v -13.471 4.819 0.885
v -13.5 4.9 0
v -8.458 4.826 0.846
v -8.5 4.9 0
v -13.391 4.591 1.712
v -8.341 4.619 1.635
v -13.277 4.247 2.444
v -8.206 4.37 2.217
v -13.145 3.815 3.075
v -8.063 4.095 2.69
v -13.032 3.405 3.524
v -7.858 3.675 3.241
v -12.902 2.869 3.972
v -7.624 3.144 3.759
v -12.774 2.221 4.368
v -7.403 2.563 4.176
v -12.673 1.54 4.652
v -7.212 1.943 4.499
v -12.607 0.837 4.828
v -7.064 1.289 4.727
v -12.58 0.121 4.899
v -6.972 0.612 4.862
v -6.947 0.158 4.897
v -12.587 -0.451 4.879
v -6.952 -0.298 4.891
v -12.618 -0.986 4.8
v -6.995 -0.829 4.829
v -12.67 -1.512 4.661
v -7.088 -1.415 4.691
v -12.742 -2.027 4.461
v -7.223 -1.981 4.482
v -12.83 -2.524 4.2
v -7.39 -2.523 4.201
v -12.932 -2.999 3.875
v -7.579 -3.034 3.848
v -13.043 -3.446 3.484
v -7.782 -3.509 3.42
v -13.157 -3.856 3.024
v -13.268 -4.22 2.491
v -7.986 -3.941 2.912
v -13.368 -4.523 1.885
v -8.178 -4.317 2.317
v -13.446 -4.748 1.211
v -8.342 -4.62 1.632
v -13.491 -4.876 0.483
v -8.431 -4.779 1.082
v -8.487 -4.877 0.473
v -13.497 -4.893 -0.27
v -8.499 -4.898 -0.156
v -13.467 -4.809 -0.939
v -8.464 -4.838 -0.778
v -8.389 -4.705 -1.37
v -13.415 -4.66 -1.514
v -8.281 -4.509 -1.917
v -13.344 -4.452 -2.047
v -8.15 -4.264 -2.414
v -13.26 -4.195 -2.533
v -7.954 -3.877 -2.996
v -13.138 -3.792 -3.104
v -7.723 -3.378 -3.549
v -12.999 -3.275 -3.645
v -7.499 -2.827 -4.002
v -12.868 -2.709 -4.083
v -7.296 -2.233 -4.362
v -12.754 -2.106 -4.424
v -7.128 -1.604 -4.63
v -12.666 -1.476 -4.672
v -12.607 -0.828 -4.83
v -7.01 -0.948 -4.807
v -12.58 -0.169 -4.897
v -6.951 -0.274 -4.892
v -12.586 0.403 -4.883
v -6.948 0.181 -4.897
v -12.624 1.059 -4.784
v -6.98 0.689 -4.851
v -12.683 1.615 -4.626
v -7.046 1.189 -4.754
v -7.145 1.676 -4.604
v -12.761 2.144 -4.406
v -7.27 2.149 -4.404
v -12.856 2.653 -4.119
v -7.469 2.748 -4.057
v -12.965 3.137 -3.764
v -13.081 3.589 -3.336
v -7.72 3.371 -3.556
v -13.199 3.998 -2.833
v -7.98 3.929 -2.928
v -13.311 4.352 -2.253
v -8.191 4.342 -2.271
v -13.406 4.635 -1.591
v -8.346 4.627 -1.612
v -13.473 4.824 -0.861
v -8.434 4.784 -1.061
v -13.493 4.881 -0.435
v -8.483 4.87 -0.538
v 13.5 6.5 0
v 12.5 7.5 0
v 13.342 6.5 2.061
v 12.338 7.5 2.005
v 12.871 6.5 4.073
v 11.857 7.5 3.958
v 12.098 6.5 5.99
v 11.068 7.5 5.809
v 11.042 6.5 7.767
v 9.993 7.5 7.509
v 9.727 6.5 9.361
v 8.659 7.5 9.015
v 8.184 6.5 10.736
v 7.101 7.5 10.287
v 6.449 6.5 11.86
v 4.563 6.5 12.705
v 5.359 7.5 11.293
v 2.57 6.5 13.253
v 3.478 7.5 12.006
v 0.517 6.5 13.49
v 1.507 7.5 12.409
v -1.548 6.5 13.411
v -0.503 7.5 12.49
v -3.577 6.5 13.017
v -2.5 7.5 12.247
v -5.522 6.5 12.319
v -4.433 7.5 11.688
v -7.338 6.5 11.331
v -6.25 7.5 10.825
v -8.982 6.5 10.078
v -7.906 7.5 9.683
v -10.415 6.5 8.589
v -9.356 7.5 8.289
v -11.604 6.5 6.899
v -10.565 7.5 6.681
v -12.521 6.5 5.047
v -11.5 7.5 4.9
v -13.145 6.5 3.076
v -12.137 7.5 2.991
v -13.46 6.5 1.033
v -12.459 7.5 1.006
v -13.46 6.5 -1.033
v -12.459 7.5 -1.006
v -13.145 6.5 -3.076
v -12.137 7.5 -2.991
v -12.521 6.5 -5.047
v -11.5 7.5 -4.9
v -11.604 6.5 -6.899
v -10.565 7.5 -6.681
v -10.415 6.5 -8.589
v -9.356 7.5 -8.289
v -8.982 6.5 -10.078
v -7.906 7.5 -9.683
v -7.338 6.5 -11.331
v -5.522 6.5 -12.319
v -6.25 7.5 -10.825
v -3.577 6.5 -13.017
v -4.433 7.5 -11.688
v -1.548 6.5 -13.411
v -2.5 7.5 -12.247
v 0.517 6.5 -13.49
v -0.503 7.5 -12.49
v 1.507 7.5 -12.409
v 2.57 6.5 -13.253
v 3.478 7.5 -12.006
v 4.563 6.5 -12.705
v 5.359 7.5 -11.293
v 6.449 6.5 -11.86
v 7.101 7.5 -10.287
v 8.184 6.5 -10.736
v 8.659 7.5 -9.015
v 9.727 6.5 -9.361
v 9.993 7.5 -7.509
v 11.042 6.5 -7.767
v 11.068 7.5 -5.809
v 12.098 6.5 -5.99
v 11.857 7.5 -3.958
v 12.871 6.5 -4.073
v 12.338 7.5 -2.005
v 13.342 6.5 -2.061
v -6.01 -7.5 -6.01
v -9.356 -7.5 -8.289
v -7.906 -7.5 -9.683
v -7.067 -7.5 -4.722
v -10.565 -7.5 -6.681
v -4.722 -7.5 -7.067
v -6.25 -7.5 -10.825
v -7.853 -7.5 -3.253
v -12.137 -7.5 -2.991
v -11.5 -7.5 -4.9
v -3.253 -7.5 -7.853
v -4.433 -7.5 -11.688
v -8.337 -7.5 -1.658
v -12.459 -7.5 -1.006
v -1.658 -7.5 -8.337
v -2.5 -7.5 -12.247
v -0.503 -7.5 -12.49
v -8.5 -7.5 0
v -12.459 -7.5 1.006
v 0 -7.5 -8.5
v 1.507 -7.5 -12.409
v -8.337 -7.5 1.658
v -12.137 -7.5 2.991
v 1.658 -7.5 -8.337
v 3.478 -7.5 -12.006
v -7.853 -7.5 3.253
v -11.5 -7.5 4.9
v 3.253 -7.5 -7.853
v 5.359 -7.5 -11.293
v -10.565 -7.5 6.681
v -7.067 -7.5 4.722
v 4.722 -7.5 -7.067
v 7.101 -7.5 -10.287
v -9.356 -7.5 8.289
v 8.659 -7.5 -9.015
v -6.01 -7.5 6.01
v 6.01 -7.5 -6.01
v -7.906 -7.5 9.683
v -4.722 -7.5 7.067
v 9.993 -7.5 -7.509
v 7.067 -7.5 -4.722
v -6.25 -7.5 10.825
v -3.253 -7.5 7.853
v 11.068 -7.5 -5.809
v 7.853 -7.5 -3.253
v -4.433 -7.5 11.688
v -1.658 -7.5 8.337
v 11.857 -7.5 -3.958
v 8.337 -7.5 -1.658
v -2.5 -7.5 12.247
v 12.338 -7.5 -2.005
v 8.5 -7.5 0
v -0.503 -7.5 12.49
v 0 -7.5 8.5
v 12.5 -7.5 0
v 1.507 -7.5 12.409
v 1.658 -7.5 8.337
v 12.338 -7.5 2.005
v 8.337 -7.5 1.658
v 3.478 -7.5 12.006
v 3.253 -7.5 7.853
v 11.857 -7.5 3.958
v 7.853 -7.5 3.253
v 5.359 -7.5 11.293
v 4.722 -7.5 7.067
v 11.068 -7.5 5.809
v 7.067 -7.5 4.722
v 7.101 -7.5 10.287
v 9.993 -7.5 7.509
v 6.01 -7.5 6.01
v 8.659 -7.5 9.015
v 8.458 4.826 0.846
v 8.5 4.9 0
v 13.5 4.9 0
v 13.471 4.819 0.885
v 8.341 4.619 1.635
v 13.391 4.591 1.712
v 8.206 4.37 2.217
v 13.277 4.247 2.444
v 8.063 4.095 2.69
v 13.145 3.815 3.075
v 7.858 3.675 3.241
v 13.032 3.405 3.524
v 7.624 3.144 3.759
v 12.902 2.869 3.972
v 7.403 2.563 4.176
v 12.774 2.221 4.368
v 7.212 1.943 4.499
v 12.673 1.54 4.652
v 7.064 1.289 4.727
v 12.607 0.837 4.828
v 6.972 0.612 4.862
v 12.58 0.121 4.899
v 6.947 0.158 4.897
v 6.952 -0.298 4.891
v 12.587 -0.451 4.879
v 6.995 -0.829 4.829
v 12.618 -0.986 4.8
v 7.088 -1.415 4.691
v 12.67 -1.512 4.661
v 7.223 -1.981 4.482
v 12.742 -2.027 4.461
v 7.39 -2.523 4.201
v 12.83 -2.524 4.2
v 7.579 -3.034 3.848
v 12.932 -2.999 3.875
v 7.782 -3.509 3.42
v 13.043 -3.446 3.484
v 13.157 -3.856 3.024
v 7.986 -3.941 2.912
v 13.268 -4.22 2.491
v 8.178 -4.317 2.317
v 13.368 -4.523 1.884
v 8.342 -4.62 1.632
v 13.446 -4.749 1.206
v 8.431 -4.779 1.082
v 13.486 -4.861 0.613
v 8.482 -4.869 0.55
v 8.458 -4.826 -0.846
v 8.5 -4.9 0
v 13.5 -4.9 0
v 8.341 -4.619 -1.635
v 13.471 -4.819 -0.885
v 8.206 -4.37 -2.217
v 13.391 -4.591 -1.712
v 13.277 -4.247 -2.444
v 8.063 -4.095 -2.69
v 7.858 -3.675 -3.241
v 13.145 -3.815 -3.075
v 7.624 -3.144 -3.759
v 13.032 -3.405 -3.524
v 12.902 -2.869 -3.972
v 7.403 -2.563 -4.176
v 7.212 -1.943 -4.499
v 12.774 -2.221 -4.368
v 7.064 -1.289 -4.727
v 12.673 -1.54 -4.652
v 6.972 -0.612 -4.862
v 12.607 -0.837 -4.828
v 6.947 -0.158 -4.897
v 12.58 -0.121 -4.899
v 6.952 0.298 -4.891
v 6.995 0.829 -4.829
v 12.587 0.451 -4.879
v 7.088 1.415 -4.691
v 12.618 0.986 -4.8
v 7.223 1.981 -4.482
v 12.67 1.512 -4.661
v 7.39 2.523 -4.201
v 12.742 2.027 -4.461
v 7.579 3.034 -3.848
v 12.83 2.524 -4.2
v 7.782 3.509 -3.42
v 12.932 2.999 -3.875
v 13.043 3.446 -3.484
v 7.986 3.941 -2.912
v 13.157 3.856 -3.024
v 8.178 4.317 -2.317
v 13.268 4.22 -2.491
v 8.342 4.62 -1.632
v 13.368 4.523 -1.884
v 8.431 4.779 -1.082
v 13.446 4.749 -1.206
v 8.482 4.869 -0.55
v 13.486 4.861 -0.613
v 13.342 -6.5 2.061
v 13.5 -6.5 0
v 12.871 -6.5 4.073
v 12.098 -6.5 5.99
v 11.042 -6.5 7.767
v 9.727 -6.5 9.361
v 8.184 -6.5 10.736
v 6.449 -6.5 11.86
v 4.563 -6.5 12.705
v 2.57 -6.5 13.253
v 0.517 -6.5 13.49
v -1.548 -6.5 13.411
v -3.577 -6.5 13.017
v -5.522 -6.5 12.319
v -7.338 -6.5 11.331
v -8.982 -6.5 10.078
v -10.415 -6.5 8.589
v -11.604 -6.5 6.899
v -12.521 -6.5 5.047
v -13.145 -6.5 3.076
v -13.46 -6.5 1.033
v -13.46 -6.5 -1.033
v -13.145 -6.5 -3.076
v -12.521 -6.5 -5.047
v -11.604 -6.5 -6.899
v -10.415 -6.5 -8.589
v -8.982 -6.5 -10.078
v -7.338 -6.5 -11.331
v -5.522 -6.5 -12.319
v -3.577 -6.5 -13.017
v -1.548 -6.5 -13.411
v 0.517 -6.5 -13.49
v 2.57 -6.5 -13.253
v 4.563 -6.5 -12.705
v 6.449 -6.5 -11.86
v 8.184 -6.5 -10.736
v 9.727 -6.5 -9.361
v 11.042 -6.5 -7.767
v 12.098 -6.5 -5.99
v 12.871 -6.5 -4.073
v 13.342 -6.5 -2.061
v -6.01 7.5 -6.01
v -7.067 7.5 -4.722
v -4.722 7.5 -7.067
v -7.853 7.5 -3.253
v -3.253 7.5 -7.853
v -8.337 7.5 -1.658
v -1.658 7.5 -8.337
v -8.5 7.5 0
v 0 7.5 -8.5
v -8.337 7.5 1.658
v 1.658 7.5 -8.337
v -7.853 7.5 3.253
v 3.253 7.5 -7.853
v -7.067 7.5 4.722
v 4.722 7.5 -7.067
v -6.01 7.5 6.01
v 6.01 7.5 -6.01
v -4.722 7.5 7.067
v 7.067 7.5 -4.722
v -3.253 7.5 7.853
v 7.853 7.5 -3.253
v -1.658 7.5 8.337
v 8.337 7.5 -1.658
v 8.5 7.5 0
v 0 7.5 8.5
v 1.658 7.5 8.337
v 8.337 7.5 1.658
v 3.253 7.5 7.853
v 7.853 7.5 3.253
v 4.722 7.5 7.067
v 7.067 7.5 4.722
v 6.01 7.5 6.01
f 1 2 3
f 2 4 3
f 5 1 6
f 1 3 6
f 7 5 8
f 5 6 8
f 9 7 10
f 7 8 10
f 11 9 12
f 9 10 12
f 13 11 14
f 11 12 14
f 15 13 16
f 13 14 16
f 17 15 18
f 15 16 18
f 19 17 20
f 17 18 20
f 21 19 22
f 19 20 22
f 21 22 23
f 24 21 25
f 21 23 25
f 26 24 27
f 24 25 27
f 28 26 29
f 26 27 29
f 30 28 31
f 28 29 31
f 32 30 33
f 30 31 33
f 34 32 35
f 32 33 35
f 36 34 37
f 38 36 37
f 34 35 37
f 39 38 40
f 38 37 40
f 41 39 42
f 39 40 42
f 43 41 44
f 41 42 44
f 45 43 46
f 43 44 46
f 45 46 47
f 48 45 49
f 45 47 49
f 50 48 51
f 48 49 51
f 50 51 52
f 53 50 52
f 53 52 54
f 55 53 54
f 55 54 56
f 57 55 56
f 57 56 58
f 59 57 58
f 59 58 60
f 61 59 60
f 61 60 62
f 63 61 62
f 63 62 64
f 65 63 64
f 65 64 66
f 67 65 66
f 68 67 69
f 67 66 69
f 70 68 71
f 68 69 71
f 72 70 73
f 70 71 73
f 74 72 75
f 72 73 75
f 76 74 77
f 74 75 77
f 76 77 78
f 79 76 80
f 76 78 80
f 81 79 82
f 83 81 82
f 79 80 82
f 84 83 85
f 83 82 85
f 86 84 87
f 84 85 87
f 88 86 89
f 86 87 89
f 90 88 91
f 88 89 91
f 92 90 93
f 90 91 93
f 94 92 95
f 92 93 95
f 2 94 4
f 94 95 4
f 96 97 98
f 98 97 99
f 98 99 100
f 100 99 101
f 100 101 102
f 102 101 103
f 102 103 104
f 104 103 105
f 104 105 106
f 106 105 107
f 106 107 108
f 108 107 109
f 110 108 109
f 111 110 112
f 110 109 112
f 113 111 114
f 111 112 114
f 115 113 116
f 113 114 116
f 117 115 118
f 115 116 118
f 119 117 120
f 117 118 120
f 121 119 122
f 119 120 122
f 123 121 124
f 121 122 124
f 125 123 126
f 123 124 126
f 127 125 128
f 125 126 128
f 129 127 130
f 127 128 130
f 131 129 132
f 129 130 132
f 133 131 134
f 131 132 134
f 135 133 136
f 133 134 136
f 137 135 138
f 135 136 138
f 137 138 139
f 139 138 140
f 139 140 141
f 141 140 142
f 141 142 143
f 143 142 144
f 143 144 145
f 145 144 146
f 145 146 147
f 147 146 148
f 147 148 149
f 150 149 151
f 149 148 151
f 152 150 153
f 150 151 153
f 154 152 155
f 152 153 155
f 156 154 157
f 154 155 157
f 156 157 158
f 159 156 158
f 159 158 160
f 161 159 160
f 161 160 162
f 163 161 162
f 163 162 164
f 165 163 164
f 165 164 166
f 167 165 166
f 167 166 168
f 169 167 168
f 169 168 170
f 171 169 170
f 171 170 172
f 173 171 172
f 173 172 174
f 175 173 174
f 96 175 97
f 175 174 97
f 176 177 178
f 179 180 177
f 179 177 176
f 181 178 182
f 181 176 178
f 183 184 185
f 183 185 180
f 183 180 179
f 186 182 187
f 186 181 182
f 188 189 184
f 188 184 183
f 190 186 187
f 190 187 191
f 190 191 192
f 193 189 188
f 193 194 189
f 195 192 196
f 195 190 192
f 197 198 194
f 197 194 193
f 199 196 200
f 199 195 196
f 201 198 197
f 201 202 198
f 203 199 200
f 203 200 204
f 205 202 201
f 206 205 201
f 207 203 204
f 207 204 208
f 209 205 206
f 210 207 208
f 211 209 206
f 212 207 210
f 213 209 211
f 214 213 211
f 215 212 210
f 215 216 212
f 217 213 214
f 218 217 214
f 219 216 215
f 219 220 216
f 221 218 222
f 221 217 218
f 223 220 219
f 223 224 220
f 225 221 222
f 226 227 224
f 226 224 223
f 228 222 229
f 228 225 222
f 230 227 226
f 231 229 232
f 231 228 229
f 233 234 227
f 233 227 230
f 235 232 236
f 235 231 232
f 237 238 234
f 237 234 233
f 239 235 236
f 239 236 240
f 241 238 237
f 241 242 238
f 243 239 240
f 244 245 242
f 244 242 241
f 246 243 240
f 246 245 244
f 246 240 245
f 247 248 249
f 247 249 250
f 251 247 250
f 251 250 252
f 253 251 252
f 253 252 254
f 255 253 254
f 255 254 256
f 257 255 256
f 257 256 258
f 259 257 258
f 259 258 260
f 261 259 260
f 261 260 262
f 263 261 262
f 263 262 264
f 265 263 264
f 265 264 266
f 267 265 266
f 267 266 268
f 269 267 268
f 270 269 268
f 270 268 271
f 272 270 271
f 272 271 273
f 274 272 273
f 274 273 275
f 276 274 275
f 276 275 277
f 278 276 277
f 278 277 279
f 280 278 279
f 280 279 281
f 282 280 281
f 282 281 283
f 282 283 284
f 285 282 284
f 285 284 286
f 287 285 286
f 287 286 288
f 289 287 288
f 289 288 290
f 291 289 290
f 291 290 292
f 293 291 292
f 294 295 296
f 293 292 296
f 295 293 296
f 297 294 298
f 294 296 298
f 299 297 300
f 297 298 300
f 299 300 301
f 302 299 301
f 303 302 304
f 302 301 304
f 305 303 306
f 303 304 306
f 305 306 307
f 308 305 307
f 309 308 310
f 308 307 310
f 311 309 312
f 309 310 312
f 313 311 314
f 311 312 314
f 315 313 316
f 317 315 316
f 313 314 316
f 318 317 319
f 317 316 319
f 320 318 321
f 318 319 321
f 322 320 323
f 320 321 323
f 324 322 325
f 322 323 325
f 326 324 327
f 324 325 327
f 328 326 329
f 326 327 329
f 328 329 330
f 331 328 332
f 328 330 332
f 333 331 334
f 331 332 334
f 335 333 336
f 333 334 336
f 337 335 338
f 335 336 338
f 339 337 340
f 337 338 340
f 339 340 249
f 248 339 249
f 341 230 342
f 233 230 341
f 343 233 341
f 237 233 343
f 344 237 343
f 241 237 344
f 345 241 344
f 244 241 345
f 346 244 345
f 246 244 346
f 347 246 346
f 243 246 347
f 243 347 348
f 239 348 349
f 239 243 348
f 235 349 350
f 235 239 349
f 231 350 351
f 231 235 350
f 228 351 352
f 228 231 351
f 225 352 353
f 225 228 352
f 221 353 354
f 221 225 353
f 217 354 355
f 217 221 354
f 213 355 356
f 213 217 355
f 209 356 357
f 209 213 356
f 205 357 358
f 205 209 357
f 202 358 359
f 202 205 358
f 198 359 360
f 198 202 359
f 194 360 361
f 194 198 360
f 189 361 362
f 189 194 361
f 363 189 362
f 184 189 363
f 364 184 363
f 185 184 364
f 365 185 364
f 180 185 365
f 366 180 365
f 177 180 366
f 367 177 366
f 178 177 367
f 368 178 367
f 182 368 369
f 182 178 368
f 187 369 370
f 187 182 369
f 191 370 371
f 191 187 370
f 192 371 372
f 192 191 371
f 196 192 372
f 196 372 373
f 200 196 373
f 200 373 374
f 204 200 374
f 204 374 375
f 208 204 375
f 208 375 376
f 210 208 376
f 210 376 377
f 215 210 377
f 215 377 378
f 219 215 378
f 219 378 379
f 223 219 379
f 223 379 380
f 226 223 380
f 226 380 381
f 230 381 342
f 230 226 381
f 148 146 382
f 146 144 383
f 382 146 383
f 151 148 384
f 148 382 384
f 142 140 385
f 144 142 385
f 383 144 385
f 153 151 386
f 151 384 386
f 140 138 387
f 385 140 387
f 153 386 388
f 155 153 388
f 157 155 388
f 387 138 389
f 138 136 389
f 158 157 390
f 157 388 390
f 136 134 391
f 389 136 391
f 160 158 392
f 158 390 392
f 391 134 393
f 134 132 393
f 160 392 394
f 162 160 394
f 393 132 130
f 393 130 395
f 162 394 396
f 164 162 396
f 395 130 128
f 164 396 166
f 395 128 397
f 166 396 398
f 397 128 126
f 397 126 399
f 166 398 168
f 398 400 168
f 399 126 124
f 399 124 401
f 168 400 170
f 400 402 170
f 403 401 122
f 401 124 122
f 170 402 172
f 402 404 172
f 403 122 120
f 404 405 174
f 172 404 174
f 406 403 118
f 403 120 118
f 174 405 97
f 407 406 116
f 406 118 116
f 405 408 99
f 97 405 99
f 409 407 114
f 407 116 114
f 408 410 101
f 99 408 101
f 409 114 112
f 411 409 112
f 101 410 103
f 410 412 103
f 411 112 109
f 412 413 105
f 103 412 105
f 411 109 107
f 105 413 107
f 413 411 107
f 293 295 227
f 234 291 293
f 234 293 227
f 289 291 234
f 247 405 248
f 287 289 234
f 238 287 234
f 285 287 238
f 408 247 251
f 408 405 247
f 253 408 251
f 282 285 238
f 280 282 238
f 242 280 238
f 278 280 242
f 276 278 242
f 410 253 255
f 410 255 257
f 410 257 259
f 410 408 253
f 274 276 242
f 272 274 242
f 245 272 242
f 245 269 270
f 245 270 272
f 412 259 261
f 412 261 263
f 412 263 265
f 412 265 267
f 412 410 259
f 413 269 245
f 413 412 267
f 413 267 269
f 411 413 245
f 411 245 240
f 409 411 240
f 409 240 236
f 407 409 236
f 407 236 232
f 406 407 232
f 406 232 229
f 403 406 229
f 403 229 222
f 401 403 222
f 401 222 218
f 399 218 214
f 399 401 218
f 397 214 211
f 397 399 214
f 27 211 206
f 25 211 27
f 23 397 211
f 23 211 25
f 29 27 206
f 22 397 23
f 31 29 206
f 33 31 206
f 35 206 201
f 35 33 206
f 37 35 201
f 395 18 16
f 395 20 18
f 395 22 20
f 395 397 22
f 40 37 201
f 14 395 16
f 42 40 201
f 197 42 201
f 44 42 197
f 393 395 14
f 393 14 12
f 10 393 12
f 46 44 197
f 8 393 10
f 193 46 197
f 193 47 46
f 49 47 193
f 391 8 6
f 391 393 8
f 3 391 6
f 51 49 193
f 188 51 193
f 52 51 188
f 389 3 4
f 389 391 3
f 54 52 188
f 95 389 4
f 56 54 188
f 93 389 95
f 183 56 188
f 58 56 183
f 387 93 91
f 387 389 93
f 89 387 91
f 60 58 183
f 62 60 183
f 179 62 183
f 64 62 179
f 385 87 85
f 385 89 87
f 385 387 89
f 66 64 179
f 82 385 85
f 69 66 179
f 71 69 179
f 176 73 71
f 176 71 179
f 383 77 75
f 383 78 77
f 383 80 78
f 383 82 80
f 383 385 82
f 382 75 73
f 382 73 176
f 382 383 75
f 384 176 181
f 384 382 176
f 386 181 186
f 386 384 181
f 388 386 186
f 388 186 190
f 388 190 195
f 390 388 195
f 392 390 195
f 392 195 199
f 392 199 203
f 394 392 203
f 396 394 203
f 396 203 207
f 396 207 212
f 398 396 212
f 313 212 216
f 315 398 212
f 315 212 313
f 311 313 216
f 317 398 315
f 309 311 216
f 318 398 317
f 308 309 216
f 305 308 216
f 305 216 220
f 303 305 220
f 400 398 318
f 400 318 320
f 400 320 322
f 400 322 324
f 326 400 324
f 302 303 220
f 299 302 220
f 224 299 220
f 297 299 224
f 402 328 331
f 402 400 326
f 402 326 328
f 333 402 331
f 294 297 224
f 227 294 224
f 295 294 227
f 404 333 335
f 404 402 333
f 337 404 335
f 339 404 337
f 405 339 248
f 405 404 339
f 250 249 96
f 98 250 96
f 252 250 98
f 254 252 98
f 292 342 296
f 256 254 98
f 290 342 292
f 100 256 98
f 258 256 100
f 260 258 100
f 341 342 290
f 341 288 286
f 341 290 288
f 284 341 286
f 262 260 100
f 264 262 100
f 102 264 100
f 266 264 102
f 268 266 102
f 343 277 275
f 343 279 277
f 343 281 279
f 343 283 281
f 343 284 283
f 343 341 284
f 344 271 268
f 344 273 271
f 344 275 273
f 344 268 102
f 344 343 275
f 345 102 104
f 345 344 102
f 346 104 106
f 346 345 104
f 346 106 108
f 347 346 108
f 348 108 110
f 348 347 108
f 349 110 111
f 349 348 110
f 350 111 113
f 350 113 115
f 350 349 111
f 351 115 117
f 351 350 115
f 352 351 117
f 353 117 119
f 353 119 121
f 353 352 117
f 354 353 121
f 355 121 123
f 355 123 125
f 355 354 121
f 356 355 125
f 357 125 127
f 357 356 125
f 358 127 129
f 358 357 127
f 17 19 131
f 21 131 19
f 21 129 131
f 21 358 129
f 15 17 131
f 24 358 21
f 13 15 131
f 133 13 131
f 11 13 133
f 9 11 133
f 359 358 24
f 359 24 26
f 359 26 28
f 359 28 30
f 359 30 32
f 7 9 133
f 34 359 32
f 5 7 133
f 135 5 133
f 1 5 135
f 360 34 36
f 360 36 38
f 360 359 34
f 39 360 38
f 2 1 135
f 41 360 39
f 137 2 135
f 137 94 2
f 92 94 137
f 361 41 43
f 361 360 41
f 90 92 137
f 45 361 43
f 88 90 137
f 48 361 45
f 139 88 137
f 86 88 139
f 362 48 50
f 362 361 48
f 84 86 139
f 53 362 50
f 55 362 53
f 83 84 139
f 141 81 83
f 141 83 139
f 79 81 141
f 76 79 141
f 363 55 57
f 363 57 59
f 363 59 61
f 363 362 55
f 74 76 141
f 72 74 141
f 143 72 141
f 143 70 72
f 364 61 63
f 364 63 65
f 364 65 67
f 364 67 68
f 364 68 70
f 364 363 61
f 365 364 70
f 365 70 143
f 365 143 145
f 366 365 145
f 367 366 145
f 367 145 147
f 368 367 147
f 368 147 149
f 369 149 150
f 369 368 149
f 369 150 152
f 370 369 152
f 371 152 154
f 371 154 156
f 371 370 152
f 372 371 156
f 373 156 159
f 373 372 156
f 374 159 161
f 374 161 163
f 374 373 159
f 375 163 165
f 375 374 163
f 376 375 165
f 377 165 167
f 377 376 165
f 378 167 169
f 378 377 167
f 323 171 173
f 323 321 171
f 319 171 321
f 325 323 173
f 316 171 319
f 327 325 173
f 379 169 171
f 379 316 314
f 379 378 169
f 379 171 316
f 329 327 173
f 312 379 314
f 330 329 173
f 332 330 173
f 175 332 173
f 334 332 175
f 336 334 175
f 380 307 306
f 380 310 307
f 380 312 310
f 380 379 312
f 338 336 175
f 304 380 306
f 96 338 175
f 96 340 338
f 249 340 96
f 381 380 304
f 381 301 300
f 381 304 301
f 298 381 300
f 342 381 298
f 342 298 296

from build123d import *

# Parameters (mm, degrees)
F0_R     = 13.5
F0_R_2   = 8.5
F1_DEPTH = 7.5
F2_R     = 4.9
F3_DEPTH = 15
F4_SIZE  = 1


with BuildPart() as f1:
    # F0 (on Front) → F1 (new body, symmetric)
    with BuildSketch(Plane.XZ):
        Circle(F0_R)
        Circle(F0_R_2, mode=Mode.SUBTRACT)
    extrude(amount=F1_DEPTH, both=True)

    # F2 (on Right) → F3 (cut, symmetric)
    with BuildSketch(Plane.YZ):
        Circle(F2_R)
    extrude(amount=F3_DEPTH, both=True, mode=Mode.SUBTRACT)

    # F4
    f4_edges = [f1.edges().sort_by_distance(p)[0] for p in [
        (-13.5, -7.5, 0),
        (-13.5, 7.5, 0),
    ]]
    chamfer(f4_edges, length=F4_SIZE)


solid = f1.part
